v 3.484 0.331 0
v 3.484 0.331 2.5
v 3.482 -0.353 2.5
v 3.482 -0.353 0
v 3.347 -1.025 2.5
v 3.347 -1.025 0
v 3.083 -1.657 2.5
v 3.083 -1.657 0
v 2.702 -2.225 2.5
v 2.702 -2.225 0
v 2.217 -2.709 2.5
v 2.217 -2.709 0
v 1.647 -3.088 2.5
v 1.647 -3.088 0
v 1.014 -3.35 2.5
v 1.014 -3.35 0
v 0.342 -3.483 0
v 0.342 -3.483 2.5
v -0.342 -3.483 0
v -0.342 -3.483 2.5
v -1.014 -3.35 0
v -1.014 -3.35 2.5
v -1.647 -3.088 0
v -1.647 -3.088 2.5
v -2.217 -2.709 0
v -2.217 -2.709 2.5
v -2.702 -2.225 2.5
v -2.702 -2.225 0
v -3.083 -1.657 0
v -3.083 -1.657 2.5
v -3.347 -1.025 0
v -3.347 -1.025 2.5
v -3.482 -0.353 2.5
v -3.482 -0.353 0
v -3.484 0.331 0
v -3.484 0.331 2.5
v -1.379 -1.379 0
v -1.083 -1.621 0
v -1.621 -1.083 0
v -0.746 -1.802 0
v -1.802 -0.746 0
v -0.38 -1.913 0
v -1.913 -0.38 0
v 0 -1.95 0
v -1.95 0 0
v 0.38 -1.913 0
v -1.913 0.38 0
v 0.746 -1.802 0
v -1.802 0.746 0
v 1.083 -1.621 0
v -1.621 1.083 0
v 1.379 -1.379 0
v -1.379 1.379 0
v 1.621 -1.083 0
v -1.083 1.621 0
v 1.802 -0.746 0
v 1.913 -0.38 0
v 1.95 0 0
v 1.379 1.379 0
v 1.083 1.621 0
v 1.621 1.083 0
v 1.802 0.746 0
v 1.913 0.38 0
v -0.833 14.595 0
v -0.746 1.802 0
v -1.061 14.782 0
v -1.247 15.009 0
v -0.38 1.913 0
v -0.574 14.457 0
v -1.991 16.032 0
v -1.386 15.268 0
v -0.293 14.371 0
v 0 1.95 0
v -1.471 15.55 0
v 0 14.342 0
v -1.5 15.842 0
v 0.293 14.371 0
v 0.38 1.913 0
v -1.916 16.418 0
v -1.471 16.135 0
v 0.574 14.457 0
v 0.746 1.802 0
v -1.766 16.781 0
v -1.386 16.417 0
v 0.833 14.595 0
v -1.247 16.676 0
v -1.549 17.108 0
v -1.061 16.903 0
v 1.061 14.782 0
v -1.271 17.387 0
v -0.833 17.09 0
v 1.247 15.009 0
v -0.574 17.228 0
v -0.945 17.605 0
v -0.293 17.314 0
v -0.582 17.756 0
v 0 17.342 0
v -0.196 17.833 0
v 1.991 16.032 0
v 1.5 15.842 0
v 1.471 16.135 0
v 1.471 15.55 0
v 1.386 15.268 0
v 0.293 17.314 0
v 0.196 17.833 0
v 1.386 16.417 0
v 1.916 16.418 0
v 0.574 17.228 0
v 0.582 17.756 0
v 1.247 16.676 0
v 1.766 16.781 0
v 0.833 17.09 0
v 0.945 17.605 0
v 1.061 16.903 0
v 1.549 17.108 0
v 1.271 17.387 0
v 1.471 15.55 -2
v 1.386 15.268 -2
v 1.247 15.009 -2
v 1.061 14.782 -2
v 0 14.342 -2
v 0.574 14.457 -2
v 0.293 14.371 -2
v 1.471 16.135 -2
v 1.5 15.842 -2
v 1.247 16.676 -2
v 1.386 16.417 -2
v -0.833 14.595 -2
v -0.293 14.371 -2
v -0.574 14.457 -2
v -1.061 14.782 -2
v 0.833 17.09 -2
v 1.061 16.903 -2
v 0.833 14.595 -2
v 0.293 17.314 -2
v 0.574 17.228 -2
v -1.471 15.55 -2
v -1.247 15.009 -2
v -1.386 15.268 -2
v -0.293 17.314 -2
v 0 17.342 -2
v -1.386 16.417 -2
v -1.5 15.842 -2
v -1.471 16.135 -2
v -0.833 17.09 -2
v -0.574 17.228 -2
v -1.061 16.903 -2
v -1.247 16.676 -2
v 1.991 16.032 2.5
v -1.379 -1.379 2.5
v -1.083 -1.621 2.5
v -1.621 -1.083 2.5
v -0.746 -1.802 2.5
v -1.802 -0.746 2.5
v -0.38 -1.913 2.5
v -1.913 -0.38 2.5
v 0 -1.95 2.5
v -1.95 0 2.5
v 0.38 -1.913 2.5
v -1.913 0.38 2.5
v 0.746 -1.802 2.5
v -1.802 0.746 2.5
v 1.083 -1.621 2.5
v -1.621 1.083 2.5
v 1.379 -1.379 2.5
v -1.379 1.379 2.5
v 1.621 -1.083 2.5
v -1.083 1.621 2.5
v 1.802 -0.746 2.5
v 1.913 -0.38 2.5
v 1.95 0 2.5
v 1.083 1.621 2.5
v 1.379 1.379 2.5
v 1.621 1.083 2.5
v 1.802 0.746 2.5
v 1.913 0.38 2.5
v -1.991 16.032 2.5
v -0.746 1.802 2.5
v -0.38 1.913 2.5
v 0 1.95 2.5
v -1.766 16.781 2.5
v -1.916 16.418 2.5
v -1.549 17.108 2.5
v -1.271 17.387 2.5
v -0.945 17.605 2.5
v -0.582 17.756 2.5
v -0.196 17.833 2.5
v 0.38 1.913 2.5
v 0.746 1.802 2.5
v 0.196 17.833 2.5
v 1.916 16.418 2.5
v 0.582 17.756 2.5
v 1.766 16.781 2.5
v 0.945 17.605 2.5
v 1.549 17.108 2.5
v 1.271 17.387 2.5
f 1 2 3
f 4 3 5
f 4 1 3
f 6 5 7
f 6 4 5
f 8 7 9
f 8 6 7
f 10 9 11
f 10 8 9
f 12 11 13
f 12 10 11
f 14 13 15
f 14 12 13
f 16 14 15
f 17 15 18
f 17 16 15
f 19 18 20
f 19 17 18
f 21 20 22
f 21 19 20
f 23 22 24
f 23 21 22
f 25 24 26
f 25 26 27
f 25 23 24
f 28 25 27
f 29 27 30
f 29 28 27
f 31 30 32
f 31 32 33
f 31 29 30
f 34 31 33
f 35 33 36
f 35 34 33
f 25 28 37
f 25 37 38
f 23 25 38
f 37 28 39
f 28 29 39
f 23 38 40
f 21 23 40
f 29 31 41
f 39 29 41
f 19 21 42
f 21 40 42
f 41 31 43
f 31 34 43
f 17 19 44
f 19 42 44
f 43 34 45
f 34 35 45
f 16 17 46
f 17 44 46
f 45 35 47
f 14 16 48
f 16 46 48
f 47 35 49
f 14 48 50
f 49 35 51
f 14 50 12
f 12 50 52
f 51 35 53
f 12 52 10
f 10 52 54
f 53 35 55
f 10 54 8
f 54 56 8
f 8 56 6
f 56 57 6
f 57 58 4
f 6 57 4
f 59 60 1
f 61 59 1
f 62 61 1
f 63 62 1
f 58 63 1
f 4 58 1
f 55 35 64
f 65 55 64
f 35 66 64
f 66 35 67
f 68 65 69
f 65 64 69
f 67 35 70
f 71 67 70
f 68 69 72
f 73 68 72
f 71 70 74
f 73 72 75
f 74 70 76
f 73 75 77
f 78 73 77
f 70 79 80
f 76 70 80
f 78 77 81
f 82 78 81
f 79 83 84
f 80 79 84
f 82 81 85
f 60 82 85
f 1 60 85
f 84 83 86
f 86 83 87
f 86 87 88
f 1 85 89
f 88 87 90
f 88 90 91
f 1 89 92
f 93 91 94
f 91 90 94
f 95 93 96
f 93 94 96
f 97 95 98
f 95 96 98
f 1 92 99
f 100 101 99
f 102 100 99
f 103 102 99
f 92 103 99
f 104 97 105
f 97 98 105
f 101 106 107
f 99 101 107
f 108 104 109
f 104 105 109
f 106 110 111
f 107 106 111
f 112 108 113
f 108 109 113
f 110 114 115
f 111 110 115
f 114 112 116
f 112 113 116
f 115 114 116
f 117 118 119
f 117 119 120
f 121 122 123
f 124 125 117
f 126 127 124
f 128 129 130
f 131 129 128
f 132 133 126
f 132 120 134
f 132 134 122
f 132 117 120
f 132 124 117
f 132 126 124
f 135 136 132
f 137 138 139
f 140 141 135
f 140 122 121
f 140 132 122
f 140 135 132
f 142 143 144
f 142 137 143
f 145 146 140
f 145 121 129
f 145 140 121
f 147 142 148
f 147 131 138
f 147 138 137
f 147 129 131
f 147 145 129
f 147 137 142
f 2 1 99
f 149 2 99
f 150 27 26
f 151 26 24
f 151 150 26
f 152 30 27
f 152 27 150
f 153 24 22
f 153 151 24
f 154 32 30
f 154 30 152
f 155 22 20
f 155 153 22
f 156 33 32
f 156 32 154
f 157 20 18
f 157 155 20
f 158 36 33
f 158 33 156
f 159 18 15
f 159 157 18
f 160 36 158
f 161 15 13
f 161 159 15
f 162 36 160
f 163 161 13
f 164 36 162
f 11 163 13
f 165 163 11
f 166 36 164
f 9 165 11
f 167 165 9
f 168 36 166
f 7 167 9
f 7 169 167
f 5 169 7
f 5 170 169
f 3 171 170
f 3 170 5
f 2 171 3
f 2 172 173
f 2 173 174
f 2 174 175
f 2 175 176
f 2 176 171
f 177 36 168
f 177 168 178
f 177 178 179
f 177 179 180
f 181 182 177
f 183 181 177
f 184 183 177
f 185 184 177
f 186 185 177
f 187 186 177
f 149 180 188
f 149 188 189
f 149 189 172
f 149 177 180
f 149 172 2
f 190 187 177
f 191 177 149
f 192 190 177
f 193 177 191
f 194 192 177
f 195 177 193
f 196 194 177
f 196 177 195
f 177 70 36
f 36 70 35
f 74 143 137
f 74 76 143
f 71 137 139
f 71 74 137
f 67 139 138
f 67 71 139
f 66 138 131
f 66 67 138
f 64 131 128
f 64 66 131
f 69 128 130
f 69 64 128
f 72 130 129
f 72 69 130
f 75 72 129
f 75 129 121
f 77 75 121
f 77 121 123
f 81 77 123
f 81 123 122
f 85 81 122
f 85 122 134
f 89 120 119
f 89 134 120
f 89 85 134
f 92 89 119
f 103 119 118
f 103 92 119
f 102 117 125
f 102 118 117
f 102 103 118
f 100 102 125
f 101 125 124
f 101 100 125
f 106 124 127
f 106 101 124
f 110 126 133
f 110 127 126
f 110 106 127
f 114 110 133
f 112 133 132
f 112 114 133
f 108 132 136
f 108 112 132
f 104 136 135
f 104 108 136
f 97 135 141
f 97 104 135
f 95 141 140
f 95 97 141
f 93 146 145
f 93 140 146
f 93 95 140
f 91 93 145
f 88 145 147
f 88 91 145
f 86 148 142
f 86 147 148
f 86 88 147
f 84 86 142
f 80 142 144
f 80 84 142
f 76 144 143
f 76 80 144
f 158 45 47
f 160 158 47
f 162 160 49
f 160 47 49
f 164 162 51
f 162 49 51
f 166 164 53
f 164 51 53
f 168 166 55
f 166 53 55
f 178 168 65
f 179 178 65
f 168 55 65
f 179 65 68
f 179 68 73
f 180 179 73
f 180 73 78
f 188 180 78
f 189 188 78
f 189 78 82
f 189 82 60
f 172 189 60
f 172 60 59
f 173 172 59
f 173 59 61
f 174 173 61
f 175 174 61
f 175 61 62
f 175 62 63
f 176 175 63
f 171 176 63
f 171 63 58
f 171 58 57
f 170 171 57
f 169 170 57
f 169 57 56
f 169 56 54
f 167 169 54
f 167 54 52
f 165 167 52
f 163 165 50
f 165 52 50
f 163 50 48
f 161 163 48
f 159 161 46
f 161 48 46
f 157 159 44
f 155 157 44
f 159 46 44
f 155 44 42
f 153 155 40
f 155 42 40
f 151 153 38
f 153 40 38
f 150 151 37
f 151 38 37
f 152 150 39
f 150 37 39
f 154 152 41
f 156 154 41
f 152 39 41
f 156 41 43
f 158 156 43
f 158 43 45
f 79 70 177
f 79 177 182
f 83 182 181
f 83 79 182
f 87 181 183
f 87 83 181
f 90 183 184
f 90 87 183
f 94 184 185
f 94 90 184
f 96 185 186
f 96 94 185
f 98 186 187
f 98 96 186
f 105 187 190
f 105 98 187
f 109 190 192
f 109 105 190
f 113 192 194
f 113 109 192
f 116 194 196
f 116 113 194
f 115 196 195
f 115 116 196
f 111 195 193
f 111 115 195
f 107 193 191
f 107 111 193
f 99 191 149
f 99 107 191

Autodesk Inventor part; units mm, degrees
ref_plane "YZ Plane" through (0, 0, 0) normal (1, 0, 0) x (0, 1, 0)
ref_plane "XZ Plane" through (0, 0, 0) normal (0, 1, 0) x (-1, 0, 0)
ref_plane "XY Plane" through (0, 0, 0) normal (0, 0, 1) x (1, 0, 0)
sketch "Эскиз1" plane through (0, 0, 0) normal (0, 0, 1) x (1, 0, 0)
  circle A0 centre (0, 0) radius 4 projected
  arc A1 (-13.2, 4.5) -> (-13.2, -4.5) centre (-13.2, 0) ccw projected
  line L0 (-13.2, -4.5) -> (1.3, -4.5) projected
  arc A2 (1.3, -4.5) -> (1.3, 4.5) centre (1.3, 0) ccw projected
  line L1 (1.3, 4.5) -> (-13.2, 4.5) projected
  circle A3 centre (0, 6.5601) radius 1.1 projected
  arc A4 (-8.1687, 23.1585) -> (8.1687, 23.1585) centre (0, 35.5) ccw projected
  arc A5 (10.1004, 20.2399) -> (8.1687, 23.1585) centre (9.1346, 21.6992) ccw projected
  arc A6 (-10.1004, 20.2399) -> (10.1004, 20.2399) centre (0, 35.5) ccw projected
  arc A7 (-8.1687, 23.1585) -> (-10.1004, 20.2399) centre (-9.1346, 21.6992) ccw projected
  line L2 (13.75, 27.1) -> (13.75, 10.8) projected
  line L3 (13.75, 27.1) -> (-13.75, 27.1) projected
  line L4 (-13.75, 27.1) -> (-13.75, 10.8) projected
  line L5 (-13.75, 10.8) -> (-0.7414, 4.9199) projected
  arc A8 (-0.7414, 4.9199) -> (0.7414, 4.9199) centre (0, 6.5601) ccw projected
  line L6 (0.7414, 4.9199) -> (13.75, 10.8) projected
  circle A9 centre (0, 0) radius 14.9209
  circle A10 centre (-9.898, 8.3054) radius 2
  circle A11 centre (0, 0) radius 1.5
  circle A12 centre (0, 0) radius 3.5
  line L7 (-86.0992, 75.6487) -> (86.0992, -4.6487) projected
  line L8 (-1.991, 16.0319) -> (-3.4843, 0.3314)
  line L9 (3.4843, 0.3314) -> (1.991, 16.0319)
  circle A13 centre (0, 6.5601) radius 1.25
  line L10 (1.25, 15.8425) -> (1.25, 6.5601)
  line L11 (-1.25, 6.5601) -> (-1.25, 15.8425)
  arc A14 (14.6884, 10.9864) -> (-14.6884, 10.9864) centre (0, 0) ccw projected
  arc A15 (14.8244, 8.1933) -> (14.6884, 10.9864) centre (12.6864, 9.489) ccw projected
  arc A16 (-14.6884, 10.9864) -> (-15.006, 8.5565) centre (-12.6864, 9.489) ccw projected
  circle A17 centre (0, 0) radius 15.8425
  circle A18 centre (0, 15.8425) radius 1.25
  circle A19 centre (0, 15.8425) radius 2
  line L12 (0, 7.2054) -> (0, 9.4054) projected
  line L13 (0, -12.9209) -> (0, 12.9209) projected
  point P0 (0, 0)
  point P1 (86.0992, -4.6487)
  point P2 (-1.25, 15.7932)
  point P3 (-1.249, 15.7932)
  point P4 (1.249, 15.7932)
  point P5 (1.25, 15.7932)
  point P6 (2.0213, 15.7131)
  point P7 (1.996, 15.7163)
  point P8 (-1.996, 15.7163)
  point P9 (-2.0213, 15.7131)
  dimension "d0" = 4
  dimension "d1" = 3
  dimension "d2" = 7
  dimension "d6" = 2.5
  dimension "d7" = 2.5
  dimension "d8" = 4
extrude "Выдавливание1" add sketch "Эскиз1" along normal blind 2.5 contours L9 A12 L13 A0 | A0 L13 L1 A2 L9 | L13 A12 L8 A0 | A0 L8 L1 L13 | A12 L13 A11 | A2 L1 L13 A8 L6 L9 | A12 L13 A11 | L1 L8 L5 A8 L13 | L6 A8 L13 A13 L10 A19 A9 L9 | A8 L5 L8 A9 A19 L11 A13 L13 | A9 A19 A17 L9 | L13 A3 L12 A13 | A13 L12 A3 L13 | A19 L10 A9 | A9 L10 A17 A19 | A17 A19 L9 | L8 A17 A19 A9 | L11 A19 L10 A13 | L13 L12 A3 | A3 L12 L13 | L10 A19 L11 A9 A18 | A9 A18 L10 | A17 L10 A18 L11 A19 A6 | A19 A17 L11 A9 | A9 L11 A19 | L8 A19 A17 | A18 A9 | A9 A18 A17 | A17 L11 A18 L10 | A6 A19 | L11 A18 A9 picked at (0.3204, 3.7943) picked at (-0.3204, 3.7943)
sketch "Эскиз2" plane through (0, 0, 0) normal (0, 0, -1) x (-1, 0, 0)
  circle A0 centre (0, 0) radius 14.9209
  arc A1 (1.991, 16.0319) -> (-1.991, 16.0319) centre (0, 12.9209) ccw projected
  circle A2 centre (0, 0) radius 1.95
  arc A3 (-3.4843, 0.3314) -> (3.4843, 0.3314) centre (0, 0) ccw projected
  line L0 (1.991, 16.0319) -> (3.4843, 0.3314) projected
  arc A4 (1.991, 16.0319) -> (-1.991, 16.0319) centre (0, 15.8425) ccw projected
  line L1 (-3.4843, 0.3314) -> (-1.991, 16.0319) projected
  point P0 (0, 0)
  dimension "d9" = 3.9
extrude "Выдавливание2" cut sketch "Эскиз2" against normal blind 3 contours A2
sketch "Эскиз3" plane through (0, 0, 0) normal (0, 0, -1) x (-1, 0, 0)
  circle A0 centre (0, 0) radius 1.95 projected
  arc A1 (-3.4843, 0.3314) -> (3.4843, 0.3314) centre (0, 0) ccw projected
  line L0 (1.991, 16.0319) -> (3.4843, 0.3314) projected
  arc A2 (1.991, 16.0319) -> (-1.991, 16.0319) centre (0, 15.8425) ccw projected
  line L1 (-3.4843, 0.3314) -> (-1.991, 16.0319) projected
  circle A3 centre (0, 15.8425) radius 1.5
  point P0 (0, 0)
  dimension "d12" = 3
extrude "Выдавливание3" add sketch "Эскиз3" along normal blind 2 contours A3
properties part number "shatun_lidar"
